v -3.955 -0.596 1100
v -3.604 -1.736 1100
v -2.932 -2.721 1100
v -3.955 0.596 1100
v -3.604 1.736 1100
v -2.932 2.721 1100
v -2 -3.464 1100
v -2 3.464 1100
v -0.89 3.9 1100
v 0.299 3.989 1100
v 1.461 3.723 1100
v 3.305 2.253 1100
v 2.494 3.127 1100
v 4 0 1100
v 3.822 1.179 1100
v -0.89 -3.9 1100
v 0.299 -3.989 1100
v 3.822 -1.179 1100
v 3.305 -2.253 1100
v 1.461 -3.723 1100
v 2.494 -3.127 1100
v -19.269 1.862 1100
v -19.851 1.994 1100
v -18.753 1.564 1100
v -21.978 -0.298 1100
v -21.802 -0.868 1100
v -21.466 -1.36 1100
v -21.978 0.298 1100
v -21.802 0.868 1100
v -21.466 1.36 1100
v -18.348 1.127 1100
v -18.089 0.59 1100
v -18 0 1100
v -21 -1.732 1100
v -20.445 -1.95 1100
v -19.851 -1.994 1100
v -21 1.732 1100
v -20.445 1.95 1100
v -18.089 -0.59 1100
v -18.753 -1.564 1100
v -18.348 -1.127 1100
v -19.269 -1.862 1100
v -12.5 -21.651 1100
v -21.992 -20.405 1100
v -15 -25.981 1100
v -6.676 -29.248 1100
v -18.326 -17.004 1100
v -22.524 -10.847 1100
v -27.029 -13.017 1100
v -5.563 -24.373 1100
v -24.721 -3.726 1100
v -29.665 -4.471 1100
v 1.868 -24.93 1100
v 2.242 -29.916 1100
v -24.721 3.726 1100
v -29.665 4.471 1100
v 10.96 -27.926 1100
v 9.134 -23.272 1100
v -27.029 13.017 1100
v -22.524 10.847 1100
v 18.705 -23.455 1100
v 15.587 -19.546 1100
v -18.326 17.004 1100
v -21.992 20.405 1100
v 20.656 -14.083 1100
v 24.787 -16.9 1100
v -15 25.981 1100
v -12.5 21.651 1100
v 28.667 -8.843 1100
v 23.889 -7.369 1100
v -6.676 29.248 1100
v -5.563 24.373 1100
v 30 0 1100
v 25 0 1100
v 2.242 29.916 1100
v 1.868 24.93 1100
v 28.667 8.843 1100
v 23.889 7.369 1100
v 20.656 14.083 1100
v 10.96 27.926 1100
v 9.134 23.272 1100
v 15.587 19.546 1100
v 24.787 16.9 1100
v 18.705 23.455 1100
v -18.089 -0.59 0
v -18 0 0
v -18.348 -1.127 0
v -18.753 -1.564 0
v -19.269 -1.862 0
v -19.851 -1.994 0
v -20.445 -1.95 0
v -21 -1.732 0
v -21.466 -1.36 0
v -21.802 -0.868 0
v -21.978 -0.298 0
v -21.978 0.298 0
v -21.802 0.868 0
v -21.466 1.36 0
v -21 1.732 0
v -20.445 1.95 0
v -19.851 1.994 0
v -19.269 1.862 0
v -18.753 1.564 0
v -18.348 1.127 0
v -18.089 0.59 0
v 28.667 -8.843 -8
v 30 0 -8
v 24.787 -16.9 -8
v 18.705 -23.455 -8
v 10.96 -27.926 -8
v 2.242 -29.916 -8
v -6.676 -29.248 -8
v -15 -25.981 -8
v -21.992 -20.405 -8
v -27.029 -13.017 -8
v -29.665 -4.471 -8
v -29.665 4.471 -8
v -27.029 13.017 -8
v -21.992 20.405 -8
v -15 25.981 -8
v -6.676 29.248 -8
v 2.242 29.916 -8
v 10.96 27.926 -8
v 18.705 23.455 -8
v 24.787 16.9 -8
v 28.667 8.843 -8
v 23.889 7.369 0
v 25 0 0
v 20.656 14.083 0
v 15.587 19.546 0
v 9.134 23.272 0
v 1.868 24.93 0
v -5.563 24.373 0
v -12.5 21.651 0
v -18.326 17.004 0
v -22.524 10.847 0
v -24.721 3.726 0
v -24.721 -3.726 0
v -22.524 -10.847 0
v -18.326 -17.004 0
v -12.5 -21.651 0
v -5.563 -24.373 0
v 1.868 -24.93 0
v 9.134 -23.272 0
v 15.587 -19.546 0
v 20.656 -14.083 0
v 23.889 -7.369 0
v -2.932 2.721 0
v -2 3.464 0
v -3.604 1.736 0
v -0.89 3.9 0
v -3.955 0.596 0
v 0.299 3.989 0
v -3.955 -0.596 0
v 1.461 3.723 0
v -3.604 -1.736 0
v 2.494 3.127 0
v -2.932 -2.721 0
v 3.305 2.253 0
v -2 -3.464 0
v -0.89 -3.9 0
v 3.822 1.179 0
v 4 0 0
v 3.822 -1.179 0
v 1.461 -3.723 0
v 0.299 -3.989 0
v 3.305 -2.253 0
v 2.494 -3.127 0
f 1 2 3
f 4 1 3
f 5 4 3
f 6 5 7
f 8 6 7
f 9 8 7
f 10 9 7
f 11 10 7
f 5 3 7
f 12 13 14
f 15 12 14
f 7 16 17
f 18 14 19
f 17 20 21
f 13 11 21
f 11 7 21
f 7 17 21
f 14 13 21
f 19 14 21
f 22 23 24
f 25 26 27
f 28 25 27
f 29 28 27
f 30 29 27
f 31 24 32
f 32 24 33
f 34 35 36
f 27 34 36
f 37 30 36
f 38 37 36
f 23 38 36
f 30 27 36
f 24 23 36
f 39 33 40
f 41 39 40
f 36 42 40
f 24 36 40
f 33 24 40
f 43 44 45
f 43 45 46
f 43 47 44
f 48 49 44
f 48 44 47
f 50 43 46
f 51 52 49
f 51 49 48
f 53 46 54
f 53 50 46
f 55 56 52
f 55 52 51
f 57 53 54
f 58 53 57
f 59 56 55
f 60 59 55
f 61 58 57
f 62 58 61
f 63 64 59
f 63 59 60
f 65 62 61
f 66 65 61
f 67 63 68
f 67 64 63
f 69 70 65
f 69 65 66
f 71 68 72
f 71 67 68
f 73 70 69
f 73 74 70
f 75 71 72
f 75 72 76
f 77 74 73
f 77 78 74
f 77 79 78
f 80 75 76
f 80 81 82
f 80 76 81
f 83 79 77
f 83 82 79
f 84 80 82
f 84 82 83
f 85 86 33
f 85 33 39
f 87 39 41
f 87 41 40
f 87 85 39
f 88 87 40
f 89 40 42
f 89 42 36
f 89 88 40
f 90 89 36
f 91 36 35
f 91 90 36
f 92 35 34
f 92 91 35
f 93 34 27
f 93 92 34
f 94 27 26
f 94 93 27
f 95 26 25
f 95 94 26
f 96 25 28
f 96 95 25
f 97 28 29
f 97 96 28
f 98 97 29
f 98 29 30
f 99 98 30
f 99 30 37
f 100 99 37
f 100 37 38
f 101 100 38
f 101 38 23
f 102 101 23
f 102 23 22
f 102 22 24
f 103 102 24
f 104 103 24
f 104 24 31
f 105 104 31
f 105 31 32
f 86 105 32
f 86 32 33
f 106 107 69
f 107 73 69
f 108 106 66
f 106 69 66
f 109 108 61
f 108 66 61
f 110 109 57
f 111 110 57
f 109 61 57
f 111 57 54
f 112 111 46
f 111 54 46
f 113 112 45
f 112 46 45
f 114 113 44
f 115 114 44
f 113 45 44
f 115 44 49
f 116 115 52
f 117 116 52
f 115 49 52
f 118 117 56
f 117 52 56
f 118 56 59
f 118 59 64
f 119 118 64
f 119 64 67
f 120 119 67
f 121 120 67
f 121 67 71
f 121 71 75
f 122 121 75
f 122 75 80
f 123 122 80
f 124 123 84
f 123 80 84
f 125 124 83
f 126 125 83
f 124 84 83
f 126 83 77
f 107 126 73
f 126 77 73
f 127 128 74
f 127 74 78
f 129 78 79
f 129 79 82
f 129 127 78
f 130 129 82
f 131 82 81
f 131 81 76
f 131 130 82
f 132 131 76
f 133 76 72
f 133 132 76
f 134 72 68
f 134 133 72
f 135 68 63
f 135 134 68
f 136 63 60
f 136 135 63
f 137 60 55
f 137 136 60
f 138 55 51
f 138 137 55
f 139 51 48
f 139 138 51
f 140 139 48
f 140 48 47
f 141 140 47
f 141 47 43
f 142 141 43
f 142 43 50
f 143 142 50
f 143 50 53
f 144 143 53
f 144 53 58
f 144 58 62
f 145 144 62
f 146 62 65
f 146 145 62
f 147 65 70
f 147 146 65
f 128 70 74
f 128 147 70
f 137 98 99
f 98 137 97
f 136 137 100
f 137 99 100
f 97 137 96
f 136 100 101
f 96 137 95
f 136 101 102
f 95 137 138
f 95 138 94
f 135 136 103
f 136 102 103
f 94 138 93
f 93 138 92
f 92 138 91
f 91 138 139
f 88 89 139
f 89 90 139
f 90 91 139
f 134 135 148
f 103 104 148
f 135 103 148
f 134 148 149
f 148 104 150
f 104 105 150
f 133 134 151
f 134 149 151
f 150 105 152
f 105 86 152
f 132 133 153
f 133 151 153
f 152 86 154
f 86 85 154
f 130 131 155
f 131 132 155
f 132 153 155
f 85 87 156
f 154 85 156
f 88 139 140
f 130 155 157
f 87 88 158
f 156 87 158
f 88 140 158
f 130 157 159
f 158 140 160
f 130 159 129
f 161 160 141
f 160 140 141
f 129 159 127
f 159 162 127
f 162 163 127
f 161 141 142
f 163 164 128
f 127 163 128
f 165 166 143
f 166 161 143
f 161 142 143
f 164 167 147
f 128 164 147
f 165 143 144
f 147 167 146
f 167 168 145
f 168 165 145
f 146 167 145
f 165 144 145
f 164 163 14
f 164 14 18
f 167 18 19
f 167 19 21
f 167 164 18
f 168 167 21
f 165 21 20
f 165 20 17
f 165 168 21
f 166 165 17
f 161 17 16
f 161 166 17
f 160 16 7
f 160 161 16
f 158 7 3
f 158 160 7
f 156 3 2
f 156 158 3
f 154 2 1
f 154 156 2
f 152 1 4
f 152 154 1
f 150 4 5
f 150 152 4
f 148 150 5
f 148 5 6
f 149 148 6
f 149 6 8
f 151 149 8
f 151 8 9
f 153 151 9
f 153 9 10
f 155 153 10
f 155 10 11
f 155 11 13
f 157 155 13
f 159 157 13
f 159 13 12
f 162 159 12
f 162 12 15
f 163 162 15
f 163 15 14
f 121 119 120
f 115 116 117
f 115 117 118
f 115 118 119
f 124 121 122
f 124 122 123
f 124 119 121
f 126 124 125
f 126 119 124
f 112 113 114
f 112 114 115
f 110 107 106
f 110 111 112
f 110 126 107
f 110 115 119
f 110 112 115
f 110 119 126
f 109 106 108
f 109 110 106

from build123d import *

# Parameters (mm, degrees)
F0_R     = 30
F0_R_2   = 25
F1_DEPTH = 1100
F2_R     = 30
F3_DEPTH = 8
F4_R     = 4
F4_R_2   = 2
F5_DEPTH = 1108


with BuildPart() as f1:
    # F0 (on Top) → F1 (new body)
    with BuildSketch(Plane.XY):
        Circle(F0_R)
        Circle(F0_R_2, mode=Mode.SUBTRACT)
    extrude(amount=F1_DEPTH)

    # F2 (on face) → F3 (join)
    with BuildSketch(Plane(origin=(0, 0, 0), x_dir=(1, 0, 0), z_dir=(0, 0, -1))):
        Circle(F2_R)
    extrude(amount=F3_DEPTH)

    # F4 (on face) → F5 (join)
    with BuildSketch(Plane(origin=(0, 0, -8), x_dir=(1, 0, 0), z_dir=(0, 0, -1))):
        Circle(F4_R)
        with Locations((-20, 0)):
            Circle(F4_R_2)
    extrude(amount=-F5_DEPTH)


solid = f1.part
